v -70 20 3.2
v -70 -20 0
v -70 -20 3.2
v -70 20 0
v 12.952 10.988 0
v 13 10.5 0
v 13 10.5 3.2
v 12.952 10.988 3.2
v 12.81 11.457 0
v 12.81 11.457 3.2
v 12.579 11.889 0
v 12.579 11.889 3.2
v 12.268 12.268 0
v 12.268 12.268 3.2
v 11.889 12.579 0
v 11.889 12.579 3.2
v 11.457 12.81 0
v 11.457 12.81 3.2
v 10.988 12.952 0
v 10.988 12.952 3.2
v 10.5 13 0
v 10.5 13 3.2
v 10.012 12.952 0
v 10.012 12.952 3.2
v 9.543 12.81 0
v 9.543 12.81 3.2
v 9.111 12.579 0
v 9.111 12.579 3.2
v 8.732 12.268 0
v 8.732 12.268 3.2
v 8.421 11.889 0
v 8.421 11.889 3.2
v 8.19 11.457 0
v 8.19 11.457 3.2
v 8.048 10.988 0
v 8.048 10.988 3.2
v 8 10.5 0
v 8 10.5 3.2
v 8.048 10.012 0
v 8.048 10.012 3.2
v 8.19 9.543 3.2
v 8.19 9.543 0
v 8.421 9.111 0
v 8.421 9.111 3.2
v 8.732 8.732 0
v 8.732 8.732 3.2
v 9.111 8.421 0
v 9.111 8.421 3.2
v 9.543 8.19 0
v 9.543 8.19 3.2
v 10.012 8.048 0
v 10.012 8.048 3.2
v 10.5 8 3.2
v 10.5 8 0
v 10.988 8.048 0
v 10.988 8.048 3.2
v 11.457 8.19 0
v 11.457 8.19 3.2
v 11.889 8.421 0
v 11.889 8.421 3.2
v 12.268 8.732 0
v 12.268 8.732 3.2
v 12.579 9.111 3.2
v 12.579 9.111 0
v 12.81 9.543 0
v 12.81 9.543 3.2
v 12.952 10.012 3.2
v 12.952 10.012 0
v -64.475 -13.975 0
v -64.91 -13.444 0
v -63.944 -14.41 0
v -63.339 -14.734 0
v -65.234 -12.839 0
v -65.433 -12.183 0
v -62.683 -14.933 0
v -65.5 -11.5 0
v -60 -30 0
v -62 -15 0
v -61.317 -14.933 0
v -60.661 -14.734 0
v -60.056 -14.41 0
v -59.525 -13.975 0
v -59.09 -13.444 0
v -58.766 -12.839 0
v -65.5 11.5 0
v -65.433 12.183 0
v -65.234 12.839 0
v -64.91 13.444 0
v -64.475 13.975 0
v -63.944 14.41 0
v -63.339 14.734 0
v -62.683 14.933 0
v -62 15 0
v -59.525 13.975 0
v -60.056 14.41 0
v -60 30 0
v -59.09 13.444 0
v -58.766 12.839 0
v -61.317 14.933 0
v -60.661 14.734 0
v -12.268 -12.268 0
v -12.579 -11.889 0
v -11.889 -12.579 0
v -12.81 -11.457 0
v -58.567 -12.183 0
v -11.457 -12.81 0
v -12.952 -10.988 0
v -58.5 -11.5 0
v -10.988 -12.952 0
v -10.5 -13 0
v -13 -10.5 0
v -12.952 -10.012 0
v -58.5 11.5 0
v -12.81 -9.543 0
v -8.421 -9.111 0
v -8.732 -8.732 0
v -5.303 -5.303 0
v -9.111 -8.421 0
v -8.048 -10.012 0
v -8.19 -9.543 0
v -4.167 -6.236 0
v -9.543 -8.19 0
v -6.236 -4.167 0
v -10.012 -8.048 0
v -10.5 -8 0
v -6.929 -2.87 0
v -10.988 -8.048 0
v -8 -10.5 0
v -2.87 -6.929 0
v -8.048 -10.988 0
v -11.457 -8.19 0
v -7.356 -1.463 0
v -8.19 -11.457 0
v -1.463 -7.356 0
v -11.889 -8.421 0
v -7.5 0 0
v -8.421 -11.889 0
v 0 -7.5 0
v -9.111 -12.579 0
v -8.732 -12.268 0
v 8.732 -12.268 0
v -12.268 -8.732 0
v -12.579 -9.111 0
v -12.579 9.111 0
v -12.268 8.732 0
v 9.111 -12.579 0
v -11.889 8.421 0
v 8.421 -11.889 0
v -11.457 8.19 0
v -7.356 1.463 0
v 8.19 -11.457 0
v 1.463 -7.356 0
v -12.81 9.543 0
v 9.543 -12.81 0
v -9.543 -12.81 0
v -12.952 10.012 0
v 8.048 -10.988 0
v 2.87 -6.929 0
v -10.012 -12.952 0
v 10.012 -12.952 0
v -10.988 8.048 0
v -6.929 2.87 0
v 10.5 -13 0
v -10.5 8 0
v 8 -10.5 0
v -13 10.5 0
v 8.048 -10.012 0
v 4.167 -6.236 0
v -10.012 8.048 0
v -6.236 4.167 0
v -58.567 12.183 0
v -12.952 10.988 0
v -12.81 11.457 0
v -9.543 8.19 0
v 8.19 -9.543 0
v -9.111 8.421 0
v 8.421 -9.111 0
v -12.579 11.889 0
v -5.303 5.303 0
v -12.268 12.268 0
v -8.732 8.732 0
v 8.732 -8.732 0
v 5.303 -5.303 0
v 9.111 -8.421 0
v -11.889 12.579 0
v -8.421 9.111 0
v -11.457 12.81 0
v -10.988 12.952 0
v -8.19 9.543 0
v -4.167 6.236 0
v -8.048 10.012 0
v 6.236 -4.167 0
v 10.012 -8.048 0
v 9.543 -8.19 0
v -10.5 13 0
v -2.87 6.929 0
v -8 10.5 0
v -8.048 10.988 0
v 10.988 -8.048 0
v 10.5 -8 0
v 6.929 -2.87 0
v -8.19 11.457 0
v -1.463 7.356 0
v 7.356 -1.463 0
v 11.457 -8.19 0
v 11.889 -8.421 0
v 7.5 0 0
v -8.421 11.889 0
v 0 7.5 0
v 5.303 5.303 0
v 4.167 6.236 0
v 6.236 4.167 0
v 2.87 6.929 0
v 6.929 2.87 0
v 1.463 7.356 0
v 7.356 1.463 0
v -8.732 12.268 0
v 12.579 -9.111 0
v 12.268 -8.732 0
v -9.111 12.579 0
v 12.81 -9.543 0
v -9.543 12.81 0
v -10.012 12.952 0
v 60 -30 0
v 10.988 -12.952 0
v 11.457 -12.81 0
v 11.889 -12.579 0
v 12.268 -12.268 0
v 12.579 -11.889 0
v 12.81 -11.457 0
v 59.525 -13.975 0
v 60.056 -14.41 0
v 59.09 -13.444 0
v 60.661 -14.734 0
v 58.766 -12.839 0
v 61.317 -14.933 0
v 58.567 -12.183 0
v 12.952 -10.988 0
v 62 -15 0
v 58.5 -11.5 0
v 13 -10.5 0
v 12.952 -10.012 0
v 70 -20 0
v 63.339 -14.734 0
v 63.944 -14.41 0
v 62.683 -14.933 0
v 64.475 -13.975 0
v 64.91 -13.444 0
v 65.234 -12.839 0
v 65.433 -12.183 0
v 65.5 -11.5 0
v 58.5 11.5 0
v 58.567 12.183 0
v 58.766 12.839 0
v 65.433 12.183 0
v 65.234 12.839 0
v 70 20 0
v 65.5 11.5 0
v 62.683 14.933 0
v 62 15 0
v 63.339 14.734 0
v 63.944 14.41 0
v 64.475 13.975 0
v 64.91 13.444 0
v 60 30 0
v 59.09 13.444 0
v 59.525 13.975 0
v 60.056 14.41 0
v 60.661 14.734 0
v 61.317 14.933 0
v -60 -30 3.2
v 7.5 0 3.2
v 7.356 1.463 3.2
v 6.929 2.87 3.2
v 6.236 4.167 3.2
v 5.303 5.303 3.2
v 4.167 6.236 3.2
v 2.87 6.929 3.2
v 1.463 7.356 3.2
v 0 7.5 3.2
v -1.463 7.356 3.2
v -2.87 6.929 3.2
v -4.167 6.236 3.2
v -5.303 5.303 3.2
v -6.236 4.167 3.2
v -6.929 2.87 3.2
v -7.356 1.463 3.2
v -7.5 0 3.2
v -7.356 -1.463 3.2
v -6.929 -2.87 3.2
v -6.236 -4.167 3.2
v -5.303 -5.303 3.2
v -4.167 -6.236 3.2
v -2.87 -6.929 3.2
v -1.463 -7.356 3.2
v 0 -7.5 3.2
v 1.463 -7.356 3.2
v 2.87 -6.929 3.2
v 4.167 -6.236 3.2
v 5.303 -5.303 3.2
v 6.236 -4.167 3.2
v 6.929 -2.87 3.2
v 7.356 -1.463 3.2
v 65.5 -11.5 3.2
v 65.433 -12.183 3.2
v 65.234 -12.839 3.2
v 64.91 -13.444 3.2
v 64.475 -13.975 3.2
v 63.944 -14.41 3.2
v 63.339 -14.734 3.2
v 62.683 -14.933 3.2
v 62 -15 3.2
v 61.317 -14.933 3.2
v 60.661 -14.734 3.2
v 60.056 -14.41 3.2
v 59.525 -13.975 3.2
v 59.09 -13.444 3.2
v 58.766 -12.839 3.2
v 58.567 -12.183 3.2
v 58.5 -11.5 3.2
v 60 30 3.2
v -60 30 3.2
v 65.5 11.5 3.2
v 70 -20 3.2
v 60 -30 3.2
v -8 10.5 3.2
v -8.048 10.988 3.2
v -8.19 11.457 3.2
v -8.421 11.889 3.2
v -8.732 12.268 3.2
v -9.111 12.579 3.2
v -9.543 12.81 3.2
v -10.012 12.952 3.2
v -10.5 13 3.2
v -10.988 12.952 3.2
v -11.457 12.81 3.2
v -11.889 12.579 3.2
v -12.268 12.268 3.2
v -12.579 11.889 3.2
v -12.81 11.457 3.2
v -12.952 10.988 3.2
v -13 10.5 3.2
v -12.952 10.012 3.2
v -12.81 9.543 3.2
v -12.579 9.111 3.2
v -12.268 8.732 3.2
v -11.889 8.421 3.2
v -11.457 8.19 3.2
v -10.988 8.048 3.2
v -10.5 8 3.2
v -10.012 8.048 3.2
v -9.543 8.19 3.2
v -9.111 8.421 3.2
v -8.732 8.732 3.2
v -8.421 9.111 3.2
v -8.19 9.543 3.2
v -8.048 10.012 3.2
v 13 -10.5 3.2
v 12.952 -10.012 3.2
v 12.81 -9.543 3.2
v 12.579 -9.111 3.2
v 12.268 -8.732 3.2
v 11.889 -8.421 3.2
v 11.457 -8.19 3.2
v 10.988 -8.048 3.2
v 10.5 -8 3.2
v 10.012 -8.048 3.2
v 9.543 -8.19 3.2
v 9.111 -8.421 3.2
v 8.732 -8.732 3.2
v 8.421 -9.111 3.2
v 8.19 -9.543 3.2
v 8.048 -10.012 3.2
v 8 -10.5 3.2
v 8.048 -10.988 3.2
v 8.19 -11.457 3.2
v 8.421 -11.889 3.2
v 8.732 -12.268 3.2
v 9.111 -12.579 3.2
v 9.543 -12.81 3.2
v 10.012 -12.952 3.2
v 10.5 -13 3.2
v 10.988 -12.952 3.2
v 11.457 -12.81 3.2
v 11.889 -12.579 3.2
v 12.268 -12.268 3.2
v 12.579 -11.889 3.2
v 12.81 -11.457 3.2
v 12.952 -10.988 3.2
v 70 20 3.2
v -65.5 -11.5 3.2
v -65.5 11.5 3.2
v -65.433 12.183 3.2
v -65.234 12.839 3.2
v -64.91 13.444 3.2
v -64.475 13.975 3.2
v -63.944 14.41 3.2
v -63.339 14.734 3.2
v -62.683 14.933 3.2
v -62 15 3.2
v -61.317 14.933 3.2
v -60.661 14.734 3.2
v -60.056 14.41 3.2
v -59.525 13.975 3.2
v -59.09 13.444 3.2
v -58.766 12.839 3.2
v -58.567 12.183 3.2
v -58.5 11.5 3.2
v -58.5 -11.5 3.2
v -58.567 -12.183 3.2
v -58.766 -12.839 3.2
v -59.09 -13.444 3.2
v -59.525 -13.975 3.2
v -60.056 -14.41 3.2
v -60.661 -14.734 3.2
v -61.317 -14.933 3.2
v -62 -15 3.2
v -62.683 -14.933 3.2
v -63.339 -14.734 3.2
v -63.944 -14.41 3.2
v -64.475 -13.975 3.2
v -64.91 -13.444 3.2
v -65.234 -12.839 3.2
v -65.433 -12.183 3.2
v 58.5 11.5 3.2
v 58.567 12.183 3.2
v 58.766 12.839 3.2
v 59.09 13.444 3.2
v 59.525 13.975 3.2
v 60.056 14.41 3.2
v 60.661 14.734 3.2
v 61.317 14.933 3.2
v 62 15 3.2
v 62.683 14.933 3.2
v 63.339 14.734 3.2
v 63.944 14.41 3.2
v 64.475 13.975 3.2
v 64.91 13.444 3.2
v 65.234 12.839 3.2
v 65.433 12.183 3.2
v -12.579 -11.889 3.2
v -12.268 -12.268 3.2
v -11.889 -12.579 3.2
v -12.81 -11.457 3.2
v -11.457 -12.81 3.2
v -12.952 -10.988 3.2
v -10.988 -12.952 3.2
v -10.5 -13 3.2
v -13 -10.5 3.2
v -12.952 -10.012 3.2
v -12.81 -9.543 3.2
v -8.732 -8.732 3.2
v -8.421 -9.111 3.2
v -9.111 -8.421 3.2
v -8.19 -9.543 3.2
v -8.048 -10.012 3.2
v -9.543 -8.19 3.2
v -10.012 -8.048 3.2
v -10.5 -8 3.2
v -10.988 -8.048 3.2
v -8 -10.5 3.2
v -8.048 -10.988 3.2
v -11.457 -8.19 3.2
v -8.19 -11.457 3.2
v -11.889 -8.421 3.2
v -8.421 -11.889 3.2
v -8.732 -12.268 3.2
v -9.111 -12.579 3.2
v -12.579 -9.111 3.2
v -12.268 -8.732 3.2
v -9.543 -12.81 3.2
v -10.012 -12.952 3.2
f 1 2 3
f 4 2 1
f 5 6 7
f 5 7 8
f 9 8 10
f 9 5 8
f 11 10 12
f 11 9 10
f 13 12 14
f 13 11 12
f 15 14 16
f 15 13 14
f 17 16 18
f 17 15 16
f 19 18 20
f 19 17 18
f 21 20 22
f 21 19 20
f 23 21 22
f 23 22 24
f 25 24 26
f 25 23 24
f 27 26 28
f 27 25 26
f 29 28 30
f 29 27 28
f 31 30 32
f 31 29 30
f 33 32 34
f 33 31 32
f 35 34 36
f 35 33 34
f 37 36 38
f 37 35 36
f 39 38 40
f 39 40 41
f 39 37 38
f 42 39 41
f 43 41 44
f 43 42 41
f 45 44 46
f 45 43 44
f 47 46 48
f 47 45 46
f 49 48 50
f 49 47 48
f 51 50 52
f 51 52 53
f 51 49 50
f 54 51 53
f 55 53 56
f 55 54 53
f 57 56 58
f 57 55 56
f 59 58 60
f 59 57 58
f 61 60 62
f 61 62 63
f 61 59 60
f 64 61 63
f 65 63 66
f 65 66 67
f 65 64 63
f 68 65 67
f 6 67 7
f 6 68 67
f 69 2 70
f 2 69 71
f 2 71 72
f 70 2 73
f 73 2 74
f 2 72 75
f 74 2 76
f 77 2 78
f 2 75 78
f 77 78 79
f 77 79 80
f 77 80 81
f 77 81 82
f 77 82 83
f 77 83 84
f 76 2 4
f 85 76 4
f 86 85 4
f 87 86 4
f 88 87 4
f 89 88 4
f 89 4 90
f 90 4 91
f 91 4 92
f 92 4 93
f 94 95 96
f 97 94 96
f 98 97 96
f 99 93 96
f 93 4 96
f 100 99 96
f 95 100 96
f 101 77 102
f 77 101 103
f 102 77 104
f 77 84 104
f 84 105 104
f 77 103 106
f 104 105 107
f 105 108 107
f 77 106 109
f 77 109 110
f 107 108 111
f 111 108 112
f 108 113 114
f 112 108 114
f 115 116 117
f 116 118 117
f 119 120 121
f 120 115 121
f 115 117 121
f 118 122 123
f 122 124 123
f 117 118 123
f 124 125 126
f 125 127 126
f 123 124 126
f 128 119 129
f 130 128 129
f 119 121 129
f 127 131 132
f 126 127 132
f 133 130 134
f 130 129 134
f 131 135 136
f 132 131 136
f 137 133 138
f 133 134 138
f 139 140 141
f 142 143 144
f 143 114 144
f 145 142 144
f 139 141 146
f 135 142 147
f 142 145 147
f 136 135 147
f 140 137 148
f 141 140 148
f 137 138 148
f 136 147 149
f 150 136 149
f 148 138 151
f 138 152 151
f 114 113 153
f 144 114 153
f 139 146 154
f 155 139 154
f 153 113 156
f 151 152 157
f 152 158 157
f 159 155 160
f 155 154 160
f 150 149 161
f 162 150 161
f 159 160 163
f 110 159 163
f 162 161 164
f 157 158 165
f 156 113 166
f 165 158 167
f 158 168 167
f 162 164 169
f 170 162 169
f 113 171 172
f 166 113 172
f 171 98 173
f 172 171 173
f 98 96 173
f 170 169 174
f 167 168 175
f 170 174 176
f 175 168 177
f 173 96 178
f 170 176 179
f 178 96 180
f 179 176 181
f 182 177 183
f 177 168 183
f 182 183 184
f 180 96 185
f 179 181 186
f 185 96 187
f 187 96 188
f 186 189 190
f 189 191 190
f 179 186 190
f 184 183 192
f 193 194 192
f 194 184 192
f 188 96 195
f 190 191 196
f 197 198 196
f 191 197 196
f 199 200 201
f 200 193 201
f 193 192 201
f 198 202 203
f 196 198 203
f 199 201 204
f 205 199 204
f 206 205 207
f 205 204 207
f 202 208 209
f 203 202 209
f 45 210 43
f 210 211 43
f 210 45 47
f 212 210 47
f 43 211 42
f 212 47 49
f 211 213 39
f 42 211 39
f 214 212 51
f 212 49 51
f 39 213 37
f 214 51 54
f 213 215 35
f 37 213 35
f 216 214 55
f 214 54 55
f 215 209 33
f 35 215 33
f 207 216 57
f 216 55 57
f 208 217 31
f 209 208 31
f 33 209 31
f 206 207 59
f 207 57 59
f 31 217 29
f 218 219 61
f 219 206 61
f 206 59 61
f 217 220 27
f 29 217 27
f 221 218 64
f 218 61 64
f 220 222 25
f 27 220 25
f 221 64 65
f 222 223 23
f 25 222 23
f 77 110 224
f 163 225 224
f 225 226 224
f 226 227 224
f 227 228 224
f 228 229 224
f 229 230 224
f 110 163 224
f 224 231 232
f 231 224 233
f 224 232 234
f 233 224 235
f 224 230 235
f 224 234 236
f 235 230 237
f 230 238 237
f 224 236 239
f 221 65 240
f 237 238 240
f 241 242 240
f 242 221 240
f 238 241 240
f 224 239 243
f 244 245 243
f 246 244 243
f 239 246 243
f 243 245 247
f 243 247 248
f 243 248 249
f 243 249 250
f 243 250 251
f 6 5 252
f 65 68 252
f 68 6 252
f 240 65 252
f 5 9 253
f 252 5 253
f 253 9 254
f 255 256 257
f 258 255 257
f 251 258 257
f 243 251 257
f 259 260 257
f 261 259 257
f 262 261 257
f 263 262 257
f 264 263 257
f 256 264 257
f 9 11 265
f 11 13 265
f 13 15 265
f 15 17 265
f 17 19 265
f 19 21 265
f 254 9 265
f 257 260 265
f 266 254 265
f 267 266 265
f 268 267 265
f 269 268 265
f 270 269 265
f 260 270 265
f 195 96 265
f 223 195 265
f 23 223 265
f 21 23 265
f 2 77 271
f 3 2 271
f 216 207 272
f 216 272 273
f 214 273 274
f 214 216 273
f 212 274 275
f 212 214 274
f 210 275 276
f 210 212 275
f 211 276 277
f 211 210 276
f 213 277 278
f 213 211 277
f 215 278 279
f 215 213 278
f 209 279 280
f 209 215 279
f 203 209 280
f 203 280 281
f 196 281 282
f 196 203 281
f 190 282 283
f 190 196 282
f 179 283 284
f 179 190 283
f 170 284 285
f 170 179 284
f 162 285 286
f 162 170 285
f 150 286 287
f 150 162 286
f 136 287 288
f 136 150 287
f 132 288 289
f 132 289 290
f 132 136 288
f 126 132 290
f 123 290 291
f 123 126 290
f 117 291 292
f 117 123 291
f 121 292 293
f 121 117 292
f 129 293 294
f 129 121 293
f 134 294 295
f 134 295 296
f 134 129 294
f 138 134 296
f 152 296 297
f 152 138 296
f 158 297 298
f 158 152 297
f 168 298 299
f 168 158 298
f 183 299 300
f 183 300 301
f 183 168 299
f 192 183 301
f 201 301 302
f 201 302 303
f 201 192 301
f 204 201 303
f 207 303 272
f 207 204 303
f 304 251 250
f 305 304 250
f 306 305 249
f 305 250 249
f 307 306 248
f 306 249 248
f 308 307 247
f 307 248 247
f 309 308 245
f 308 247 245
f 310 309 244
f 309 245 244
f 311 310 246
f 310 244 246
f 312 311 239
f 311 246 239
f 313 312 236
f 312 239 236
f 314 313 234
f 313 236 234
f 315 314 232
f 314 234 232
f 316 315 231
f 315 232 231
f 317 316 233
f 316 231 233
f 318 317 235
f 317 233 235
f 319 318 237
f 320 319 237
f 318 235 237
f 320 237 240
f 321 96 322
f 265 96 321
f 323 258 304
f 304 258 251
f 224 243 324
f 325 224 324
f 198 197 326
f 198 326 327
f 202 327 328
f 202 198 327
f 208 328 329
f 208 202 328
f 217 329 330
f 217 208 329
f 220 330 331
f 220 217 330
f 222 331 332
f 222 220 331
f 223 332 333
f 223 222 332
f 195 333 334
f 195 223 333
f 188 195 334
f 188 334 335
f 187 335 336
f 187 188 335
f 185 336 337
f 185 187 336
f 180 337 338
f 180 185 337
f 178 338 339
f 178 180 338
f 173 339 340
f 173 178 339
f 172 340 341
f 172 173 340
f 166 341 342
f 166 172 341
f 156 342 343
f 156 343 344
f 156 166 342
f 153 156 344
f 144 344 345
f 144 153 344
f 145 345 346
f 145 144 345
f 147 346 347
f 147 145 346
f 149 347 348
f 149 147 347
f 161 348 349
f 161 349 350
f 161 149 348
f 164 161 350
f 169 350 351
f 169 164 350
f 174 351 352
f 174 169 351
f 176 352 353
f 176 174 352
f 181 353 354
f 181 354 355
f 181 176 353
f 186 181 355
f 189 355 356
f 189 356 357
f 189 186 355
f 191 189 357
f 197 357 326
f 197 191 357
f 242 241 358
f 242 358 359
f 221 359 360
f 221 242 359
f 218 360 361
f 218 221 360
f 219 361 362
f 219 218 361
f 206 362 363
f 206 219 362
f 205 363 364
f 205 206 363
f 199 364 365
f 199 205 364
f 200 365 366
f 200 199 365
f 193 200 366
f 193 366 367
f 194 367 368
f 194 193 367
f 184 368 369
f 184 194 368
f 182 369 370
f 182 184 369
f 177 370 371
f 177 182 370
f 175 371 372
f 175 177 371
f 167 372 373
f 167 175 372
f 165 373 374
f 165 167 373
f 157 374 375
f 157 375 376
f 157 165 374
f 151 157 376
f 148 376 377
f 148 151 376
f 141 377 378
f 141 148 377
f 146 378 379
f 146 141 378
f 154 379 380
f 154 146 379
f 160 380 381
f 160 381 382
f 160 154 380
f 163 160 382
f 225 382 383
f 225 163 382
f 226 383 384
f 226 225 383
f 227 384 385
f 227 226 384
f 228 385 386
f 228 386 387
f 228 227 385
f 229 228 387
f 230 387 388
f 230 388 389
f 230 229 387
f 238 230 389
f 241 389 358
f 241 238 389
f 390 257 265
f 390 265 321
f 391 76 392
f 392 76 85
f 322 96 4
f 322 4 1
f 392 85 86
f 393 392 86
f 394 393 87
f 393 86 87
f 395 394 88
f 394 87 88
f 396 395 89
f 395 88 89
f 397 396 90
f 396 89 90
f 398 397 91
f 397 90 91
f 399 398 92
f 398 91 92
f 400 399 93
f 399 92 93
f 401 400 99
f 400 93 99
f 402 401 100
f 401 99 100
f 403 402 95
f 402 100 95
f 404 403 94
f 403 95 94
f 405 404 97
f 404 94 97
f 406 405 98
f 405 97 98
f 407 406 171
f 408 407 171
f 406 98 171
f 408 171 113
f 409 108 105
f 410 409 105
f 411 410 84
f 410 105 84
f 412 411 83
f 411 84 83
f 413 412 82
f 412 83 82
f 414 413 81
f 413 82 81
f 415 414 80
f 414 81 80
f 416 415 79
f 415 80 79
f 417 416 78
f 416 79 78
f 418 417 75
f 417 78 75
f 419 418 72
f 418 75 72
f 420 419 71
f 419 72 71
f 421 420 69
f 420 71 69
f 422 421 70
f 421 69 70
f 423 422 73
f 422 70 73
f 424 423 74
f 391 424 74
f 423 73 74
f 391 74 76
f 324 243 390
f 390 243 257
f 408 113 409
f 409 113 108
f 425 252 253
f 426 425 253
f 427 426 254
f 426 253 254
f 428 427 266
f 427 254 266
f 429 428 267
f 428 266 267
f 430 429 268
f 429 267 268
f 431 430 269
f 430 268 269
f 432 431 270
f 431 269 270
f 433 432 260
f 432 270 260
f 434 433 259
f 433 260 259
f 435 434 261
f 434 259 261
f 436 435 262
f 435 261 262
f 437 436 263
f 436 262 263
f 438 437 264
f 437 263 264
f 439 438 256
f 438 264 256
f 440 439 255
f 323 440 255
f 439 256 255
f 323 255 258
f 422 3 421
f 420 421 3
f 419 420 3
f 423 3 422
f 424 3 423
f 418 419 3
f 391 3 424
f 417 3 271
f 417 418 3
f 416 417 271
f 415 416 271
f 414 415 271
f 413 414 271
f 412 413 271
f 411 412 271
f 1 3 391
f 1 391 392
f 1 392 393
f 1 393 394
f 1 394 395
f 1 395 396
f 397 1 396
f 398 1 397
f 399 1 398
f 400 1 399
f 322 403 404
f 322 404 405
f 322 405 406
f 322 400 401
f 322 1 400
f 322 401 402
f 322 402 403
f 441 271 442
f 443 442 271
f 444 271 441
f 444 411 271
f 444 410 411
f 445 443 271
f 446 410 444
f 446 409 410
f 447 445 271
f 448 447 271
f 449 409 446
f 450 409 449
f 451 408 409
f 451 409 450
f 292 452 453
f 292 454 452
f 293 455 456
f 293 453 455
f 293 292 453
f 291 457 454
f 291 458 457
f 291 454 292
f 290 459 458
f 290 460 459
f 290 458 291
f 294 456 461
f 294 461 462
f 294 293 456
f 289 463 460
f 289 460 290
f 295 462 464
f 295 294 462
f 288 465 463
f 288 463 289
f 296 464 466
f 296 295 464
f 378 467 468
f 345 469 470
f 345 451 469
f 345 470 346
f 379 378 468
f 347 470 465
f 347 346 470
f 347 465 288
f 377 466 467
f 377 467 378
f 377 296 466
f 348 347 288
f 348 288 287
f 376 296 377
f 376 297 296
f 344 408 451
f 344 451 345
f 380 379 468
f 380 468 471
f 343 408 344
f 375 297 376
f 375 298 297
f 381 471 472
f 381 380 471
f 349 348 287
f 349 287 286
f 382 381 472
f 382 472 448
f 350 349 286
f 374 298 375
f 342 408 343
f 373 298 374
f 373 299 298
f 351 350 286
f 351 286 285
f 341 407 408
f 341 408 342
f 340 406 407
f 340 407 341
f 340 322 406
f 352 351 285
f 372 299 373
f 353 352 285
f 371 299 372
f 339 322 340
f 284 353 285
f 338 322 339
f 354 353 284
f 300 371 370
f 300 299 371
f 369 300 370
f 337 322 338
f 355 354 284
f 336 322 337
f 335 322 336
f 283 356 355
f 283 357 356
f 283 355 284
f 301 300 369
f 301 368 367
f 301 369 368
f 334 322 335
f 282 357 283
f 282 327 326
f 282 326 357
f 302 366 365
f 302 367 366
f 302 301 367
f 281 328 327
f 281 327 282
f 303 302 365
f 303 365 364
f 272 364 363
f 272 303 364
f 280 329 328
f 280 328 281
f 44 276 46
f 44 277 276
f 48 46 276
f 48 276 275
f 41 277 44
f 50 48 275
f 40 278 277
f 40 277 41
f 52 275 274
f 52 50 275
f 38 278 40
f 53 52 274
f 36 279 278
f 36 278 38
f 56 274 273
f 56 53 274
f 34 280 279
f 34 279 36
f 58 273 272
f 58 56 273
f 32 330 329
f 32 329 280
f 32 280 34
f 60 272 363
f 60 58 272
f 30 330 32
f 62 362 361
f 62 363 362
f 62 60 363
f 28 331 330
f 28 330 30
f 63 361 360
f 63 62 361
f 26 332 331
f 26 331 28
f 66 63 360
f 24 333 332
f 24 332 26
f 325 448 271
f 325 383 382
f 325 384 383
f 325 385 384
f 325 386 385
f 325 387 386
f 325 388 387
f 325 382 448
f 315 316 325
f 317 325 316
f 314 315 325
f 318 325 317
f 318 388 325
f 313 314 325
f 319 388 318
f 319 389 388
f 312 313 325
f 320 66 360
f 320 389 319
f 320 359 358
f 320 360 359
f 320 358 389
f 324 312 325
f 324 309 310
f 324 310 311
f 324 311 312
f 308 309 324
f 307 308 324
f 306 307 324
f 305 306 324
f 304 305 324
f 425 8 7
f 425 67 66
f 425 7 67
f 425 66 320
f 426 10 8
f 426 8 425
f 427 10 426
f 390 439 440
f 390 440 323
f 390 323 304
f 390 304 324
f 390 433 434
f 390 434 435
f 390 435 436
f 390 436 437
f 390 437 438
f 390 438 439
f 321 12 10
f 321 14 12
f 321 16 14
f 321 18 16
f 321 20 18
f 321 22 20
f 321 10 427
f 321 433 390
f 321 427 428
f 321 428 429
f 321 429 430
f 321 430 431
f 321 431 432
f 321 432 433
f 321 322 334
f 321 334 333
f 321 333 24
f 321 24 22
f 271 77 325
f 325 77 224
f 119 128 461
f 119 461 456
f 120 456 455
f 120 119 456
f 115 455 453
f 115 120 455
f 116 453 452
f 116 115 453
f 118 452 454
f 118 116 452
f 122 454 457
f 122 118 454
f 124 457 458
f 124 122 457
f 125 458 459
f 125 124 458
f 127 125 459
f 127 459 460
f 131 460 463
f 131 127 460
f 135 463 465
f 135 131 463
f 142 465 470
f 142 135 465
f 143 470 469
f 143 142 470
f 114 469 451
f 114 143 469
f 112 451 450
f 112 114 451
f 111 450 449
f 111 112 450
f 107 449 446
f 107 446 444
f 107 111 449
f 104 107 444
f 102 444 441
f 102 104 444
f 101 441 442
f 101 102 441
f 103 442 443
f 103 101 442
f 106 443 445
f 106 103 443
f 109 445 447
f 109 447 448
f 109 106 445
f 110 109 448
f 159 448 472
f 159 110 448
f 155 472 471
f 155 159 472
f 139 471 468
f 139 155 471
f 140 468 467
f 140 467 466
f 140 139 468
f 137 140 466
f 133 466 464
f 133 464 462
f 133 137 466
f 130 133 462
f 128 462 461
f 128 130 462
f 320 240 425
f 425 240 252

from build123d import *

# Parameters (mm, degrees)
SKETCH1_W           = 140
SKETCH1_H           = 60
SKETCH1_R           = 7.5
SKETCH1_R_2         = 2.5
BOSS_EXTRUDE1_DEPTH = 3.2
CHAMFER1_SIZE       = 10


with BuildPart() as part:
    # Sketch1 → Boss-Extrude1 (new body)
    with BuildSketch(Plane.XY):
        Rectangle(SKETCH1_W, SKETCH1_H)
        Circle(SKETCH1_R, mode=Mode.SUBTRACT)
        with Locations((-10.5, 10.5)):
            Circle(SKETCH1_R_2, mode=Mode.SUBTRACT)
        with Locations((10.5, 10.5)):
            Circle(SKETCH1_R_2, mode=Mode.SUBTRACT)
        with Locations((10.5, -10.5)):
            Circle(SKETCH1_R_2, mode=Mode.SUBTRACT)
        with Locations((-10.5, -10.5)):
            Circle(SKETCH1_R_2, mode=Mode.SUBTRACT)
        with BuildLine():
            Line((-65.5, -11.5), (-65.5, 11.5))
            ThreePointArc((-65.5, 11.5), (-62, 15), (-58.5, 11.5))
            Line((-58.5, 11.5), (-58.5, -11.5))
            ThreePointArc((-58.5, -11.5), (-62, -15), (-65.5, -11.5))
        make_face(mode=Mode.SUBTRACT)
        with BuildLine():
            Line((58.5, -11.5), (58.5, 11.5))
            ThreePointArc((58.5, 11.5), (62, 15), (65.5, 11.5))
            Line((65.5, 11.5), (65.5, -11.5))
            ThreePointArc((65.5, -11.5), (62, -15), (58.5, -11.5))
        make_face(mode=Mode.SUBTRACT)
    extrude(amount=BOSS_EXTRUDE1_DEPTH)

    # Chamfer1
    chamfer1_edges = [part.edges().sort_by_distance(p)[0] for p in [
        (70, -30, 1.6),
        (-70, -30, 1.6),
        (-70, 30, 1.6),
        (70, 30, 1.6),
    ]]
    chamfer(chamfer1_edges, length=CHAMFER1_SIZE)


solid = part.part
